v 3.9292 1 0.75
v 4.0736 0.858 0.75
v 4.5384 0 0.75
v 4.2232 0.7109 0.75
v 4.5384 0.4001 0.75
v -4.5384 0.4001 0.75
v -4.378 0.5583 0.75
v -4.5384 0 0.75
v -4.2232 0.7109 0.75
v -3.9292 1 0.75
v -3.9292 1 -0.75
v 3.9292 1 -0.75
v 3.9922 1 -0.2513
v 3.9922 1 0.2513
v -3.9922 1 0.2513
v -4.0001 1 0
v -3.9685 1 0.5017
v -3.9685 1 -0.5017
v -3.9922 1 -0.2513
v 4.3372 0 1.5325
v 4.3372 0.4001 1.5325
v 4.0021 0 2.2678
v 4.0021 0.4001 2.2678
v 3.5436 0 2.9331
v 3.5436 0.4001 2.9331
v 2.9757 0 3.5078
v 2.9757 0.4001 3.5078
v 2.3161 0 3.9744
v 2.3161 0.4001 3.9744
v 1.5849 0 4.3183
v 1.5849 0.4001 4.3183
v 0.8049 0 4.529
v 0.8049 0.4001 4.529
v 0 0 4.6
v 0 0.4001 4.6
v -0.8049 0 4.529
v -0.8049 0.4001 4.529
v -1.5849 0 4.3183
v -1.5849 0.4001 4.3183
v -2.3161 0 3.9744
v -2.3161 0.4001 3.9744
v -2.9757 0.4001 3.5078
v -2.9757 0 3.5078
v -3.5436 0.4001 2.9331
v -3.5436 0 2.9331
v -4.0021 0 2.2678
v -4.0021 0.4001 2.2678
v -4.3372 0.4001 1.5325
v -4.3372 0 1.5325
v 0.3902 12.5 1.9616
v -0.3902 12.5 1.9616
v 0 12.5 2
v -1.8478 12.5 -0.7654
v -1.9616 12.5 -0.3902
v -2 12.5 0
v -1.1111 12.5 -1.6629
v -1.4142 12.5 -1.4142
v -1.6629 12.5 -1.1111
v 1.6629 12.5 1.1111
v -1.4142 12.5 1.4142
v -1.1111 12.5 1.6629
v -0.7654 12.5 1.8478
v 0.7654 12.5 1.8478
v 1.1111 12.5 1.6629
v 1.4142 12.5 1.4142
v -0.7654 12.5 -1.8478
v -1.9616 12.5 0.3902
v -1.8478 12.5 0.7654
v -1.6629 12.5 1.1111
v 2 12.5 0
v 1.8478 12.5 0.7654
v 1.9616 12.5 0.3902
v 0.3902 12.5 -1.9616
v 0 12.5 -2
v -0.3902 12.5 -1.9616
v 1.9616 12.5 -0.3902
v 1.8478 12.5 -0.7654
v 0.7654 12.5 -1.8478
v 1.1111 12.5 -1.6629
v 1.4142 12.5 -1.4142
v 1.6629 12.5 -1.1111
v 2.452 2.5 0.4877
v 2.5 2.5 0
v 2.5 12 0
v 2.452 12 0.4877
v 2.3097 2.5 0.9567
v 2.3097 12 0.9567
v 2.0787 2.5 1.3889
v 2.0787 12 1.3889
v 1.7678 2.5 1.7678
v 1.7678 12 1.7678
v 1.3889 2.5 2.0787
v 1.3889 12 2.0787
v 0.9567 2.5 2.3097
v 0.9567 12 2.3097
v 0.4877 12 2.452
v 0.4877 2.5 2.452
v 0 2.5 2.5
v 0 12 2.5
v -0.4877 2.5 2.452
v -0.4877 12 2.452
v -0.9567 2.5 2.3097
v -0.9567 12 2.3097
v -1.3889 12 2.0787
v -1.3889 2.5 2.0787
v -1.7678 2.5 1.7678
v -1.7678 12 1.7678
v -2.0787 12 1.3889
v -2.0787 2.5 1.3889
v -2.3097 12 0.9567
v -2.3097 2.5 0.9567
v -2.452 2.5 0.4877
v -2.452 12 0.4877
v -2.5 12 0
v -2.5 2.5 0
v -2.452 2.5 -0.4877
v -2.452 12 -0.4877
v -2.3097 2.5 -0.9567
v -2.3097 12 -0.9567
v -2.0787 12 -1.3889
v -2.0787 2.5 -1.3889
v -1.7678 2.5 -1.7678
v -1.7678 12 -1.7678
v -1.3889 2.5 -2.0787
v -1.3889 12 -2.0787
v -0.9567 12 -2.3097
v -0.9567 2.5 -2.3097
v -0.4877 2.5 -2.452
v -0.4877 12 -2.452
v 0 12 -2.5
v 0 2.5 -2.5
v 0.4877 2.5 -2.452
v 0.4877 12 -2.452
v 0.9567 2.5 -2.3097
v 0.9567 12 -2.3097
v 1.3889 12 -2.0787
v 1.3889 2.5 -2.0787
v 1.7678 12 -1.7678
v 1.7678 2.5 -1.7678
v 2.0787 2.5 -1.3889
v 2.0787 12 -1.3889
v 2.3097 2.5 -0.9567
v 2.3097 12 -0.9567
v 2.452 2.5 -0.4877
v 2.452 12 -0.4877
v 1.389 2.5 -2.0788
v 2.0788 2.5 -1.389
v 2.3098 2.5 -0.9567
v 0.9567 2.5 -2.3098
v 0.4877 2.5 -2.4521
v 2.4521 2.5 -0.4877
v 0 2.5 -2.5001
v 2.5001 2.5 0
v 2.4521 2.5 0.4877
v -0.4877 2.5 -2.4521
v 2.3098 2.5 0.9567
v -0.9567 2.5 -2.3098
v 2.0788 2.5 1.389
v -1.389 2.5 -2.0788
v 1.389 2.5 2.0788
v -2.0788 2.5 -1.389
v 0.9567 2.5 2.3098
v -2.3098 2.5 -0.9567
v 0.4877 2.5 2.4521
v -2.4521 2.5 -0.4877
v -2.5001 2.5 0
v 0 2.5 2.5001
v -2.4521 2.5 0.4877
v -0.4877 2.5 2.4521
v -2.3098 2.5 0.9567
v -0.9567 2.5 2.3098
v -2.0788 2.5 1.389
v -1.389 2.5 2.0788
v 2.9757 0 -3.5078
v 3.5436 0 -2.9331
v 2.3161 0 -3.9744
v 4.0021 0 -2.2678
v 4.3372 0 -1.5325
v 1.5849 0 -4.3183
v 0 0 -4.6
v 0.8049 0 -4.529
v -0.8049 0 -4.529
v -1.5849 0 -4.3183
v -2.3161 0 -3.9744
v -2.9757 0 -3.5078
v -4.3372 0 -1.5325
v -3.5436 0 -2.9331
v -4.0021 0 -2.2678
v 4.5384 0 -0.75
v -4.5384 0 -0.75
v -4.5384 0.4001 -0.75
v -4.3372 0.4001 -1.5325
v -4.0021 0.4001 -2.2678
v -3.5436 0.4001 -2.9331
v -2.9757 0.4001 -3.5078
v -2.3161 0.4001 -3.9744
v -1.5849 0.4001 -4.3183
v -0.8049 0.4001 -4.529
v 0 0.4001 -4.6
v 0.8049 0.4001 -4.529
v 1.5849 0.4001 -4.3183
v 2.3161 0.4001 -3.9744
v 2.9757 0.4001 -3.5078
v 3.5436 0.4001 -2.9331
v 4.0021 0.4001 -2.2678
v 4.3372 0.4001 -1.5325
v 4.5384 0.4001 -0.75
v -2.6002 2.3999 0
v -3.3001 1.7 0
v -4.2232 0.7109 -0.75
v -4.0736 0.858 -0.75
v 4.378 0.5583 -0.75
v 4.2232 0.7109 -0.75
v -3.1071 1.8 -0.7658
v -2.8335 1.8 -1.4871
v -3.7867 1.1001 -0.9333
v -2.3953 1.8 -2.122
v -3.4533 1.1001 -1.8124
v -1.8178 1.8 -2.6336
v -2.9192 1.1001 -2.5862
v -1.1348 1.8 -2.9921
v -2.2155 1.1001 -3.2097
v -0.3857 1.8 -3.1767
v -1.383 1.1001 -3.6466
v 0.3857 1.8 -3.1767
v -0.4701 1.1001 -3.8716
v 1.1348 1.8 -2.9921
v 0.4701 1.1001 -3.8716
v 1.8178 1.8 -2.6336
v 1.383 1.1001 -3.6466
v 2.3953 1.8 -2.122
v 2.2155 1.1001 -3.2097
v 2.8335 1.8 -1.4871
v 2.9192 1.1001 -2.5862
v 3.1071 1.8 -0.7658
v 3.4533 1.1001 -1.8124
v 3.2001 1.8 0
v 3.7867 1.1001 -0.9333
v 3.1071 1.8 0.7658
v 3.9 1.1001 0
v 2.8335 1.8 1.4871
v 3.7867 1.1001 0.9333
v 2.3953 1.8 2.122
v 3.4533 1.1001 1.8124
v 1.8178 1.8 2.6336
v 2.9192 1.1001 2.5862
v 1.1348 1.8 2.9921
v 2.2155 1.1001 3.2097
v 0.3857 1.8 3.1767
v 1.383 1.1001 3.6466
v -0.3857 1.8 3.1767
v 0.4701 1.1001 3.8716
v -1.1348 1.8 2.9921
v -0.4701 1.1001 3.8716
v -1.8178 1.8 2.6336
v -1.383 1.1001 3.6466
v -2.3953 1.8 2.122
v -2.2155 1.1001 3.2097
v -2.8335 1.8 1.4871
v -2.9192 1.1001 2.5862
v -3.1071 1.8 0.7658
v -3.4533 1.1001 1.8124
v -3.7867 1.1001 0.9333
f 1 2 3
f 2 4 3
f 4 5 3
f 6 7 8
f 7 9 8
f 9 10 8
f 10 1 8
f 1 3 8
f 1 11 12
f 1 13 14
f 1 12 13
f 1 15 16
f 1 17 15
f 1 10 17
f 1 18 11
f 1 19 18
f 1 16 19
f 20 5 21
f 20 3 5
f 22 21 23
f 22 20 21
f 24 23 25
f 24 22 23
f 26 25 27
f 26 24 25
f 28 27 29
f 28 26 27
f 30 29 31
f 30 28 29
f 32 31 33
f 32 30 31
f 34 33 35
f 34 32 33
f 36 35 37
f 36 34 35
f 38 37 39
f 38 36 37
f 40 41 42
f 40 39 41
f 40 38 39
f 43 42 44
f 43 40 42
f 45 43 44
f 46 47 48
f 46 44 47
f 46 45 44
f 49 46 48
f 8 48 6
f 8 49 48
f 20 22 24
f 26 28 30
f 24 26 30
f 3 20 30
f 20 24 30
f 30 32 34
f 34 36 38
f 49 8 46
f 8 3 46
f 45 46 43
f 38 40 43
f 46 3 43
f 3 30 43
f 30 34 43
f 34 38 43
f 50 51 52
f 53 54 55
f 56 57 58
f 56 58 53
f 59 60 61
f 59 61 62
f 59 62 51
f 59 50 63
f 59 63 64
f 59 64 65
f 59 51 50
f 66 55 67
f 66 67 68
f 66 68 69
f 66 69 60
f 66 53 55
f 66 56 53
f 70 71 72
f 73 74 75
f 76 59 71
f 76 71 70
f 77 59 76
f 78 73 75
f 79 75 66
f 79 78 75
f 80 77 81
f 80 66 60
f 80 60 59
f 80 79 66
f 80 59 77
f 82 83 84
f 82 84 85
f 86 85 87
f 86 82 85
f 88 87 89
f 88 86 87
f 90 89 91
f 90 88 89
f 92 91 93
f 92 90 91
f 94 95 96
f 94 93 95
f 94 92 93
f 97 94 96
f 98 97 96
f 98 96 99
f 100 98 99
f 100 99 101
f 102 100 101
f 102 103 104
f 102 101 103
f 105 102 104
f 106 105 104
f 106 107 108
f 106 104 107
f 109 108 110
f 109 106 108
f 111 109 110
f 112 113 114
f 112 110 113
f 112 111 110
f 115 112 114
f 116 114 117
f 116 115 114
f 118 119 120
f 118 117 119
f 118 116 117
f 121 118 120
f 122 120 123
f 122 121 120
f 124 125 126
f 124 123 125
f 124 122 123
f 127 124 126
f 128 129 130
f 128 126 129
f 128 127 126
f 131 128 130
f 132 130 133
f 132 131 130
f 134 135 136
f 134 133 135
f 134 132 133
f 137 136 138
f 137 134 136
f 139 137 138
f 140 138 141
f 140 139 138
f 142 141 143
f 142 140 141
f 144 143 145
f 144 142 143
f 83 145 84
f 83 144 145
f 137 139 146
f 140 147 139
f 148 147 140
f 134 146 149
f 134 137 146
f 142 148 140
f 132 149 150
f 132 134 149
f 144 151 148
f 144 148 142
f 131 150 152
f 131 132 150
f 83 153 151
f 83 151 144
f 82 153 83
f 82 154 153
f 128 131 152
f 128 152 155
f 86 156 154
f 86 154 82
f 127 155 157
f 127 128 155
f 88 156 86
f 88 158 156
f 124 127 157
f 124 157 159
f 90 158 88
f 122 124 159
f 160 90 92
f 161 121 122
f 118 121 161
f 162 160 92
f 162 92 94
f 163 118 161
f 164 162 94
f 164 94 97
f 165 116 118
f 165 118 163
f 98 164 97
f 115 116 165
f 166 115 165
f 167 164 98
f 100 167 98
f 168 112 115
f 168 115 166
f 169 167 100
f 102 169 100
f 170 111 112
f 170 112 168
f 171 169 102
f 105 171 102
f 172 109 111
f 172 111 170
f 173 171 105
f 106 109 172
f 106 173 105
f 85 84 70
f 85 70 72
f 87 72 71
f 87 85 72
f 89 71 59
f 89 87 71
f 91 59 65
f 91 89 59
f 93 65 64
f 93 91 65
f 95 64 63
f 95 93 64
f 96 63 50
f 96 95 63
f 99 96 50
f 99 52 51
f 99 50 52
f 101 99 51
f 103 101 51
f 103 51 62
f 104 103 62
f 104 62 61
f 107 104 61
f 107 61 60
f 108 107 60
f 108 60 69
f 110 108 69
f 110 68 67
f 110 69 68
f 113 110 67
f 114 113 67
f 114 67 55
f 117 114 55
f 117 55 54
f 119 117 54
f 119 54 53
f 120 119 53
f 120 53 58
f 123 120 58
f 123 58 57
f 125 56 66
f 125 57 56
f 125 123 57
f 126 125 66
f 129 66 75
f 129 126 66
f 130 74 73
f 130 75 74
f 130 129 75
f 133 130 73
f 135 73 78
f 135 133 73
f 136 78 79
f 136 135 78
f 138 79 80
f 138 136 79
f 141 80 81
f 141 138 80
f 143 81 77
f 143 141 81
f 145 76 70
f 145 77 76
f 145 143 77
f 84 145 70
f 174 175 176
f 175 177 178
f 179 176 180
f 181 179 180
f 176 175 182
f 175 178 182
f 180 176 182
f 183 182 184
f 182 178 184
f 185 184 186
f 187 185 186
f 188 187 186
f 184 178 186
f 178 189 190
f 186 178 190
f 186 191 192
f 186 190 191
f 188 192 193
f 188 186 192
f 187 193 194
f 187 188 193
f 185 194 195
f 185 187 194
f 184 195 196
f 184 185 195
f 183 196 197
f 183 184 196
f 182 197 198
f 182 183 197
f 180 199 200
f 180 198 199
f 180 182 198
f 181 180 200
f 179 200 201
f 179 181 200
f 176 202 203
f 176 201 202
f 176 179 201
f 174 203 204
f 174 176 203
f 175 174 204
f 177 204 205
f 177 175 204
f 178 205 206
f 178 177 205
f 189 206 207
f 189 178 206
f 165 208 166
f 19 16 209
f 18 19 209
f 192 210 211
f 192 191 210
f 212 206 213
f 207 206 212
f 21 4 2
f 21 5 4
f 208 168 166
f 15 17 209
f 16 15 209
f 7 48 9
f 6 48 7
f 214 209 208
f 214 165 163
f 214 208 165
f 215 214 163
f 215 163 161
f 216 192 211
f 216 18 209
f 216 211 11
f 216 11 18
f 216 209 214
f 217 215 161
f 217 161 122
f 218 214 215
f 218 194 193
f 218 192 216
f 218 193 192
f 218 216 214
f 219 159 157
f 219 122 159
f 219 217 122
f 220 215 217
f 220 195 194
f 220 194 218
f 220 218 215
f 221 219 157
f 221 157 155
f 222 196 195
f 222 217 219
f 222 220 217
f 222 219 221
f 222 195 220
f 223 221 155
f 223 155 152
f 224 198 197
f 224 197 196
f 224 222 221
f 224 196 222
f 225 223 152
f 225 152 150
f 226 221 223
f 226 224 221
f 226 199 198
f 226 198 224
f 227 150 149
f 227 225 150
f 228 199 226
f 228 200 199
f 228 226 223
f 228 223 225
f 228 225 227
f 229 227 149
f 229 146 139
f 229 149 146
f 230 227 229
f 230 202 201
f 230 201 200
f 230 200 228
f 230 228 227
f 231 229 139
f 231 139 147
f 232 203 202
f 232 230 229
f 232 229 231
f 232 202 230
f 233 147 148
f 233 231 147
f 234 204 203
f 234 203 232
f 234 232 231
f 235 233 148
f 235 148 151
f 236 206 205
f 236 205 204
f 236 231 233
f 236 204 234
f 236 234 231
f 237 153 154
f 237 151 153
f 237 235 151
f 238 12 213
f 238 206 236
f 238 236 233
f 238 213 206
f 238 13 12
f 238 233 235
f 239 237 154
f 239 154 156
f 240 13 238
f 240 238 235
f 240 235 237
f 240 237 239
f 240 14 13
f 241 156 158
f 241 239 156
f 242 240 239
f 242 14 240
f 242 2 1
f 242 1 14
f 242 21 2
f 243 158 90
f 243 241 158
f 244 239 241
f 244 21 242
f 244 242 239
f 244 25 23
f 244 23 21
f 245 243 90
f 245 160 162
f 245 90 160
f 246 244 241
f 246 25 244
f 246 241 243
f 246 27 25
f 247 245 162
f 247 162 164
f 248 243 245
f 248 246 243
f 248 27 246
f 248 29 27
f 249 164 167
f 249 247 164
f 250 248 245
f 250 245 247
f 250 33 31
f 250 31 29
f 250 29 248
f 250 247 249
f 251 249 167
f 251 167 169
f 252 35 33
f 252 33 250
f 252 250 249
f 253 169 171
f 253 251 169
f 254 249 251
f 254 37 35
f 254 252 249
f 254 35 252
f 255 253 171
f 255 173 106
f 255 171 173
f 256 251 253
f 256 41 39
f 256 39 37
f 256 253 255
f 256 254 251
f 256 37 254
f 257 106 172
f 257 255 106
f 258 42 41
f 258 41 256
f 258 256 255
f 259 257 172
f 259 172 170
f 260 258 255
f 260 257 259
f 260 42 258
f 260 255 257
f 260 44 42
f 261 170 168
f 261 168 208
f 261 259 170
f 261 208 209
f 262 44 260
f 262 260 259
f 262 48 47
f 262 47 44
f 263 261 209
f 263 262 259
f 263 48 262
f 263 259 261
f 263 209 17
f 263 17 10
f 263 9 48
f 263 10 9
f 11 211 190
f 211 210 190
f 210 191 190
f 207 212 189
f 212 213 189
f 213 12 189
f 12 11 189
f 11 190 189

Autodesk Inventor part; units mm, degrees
ref_plane "YZ Plane" through (0, 0, 0) normal (1, 0, 0) x (0, 1, 0)
ref_plane "XZ Plane" through (0, 0, 0) normal (0, 1, 0) x (-1, 0, 0)
ref_plane "XY Plane" through (0, 0, 0) normal (0, 0, 1) x (1, 0, 0)
sketch "Эскиз1" plane through (0, 0, 0) normal (0, 1, 0) x (-1, 0, 0)
  circle A0 centre (0, 0) radius 4.6
  dimension "d0" = 9.2
extrude "Выдавливание1" add sketch "Эскиз1" along normal blind 2.5
sketch "Эскиз2" plane through (0, 2.5, 0) normal (0, 1, 0) x (1, 0, 0)
  circle A0 centre (0, 0) radius 2.5
  dimension "d3" = 5
extrude "Выдавливание2" add sketch "Эскиз2" along normal blind 10
chamfer "Фаска1" distance 2.1 angle 45 1 edges at (4.6, 2.5, 0)
thread "Резьба1" size "M5x0.8" class "6g" standard "ANSI Metric M Profile" full length
chamfer "Фаска2" distance 0.5 angle 45 1 edges at (-2.5, 12.5, 0)
sketch "Эскиз3" plane through (0, 0, 0) normal (0, -1, 0) x (1, 0, 0)
  line L0 (-6.5735, -0.75) -> (6.5735, -0.75)
  line L1 (6.5735, -0.75) -> (6.5735, 0.75)
  line L2 (6.5735, 0.75) -> (-6.5735, 0.75)
  line L3 (-6.5735, 0.75) -> (-6.5735, -0.75)
  line L4 (-6.5735, -0.75) -> (6.5735, 0.75) construction
  line L5 (6.5735, -0.75) -> (-6.5735, 0.75) construction
  point P0 (0, 0)
  dimension "d14" = 1.5
extrude "Выдавливание3" cut sketch "Эскиз3" against normal blind 1
properties part number "Винт М5х10 с потайной головкой" material "Сталь"
